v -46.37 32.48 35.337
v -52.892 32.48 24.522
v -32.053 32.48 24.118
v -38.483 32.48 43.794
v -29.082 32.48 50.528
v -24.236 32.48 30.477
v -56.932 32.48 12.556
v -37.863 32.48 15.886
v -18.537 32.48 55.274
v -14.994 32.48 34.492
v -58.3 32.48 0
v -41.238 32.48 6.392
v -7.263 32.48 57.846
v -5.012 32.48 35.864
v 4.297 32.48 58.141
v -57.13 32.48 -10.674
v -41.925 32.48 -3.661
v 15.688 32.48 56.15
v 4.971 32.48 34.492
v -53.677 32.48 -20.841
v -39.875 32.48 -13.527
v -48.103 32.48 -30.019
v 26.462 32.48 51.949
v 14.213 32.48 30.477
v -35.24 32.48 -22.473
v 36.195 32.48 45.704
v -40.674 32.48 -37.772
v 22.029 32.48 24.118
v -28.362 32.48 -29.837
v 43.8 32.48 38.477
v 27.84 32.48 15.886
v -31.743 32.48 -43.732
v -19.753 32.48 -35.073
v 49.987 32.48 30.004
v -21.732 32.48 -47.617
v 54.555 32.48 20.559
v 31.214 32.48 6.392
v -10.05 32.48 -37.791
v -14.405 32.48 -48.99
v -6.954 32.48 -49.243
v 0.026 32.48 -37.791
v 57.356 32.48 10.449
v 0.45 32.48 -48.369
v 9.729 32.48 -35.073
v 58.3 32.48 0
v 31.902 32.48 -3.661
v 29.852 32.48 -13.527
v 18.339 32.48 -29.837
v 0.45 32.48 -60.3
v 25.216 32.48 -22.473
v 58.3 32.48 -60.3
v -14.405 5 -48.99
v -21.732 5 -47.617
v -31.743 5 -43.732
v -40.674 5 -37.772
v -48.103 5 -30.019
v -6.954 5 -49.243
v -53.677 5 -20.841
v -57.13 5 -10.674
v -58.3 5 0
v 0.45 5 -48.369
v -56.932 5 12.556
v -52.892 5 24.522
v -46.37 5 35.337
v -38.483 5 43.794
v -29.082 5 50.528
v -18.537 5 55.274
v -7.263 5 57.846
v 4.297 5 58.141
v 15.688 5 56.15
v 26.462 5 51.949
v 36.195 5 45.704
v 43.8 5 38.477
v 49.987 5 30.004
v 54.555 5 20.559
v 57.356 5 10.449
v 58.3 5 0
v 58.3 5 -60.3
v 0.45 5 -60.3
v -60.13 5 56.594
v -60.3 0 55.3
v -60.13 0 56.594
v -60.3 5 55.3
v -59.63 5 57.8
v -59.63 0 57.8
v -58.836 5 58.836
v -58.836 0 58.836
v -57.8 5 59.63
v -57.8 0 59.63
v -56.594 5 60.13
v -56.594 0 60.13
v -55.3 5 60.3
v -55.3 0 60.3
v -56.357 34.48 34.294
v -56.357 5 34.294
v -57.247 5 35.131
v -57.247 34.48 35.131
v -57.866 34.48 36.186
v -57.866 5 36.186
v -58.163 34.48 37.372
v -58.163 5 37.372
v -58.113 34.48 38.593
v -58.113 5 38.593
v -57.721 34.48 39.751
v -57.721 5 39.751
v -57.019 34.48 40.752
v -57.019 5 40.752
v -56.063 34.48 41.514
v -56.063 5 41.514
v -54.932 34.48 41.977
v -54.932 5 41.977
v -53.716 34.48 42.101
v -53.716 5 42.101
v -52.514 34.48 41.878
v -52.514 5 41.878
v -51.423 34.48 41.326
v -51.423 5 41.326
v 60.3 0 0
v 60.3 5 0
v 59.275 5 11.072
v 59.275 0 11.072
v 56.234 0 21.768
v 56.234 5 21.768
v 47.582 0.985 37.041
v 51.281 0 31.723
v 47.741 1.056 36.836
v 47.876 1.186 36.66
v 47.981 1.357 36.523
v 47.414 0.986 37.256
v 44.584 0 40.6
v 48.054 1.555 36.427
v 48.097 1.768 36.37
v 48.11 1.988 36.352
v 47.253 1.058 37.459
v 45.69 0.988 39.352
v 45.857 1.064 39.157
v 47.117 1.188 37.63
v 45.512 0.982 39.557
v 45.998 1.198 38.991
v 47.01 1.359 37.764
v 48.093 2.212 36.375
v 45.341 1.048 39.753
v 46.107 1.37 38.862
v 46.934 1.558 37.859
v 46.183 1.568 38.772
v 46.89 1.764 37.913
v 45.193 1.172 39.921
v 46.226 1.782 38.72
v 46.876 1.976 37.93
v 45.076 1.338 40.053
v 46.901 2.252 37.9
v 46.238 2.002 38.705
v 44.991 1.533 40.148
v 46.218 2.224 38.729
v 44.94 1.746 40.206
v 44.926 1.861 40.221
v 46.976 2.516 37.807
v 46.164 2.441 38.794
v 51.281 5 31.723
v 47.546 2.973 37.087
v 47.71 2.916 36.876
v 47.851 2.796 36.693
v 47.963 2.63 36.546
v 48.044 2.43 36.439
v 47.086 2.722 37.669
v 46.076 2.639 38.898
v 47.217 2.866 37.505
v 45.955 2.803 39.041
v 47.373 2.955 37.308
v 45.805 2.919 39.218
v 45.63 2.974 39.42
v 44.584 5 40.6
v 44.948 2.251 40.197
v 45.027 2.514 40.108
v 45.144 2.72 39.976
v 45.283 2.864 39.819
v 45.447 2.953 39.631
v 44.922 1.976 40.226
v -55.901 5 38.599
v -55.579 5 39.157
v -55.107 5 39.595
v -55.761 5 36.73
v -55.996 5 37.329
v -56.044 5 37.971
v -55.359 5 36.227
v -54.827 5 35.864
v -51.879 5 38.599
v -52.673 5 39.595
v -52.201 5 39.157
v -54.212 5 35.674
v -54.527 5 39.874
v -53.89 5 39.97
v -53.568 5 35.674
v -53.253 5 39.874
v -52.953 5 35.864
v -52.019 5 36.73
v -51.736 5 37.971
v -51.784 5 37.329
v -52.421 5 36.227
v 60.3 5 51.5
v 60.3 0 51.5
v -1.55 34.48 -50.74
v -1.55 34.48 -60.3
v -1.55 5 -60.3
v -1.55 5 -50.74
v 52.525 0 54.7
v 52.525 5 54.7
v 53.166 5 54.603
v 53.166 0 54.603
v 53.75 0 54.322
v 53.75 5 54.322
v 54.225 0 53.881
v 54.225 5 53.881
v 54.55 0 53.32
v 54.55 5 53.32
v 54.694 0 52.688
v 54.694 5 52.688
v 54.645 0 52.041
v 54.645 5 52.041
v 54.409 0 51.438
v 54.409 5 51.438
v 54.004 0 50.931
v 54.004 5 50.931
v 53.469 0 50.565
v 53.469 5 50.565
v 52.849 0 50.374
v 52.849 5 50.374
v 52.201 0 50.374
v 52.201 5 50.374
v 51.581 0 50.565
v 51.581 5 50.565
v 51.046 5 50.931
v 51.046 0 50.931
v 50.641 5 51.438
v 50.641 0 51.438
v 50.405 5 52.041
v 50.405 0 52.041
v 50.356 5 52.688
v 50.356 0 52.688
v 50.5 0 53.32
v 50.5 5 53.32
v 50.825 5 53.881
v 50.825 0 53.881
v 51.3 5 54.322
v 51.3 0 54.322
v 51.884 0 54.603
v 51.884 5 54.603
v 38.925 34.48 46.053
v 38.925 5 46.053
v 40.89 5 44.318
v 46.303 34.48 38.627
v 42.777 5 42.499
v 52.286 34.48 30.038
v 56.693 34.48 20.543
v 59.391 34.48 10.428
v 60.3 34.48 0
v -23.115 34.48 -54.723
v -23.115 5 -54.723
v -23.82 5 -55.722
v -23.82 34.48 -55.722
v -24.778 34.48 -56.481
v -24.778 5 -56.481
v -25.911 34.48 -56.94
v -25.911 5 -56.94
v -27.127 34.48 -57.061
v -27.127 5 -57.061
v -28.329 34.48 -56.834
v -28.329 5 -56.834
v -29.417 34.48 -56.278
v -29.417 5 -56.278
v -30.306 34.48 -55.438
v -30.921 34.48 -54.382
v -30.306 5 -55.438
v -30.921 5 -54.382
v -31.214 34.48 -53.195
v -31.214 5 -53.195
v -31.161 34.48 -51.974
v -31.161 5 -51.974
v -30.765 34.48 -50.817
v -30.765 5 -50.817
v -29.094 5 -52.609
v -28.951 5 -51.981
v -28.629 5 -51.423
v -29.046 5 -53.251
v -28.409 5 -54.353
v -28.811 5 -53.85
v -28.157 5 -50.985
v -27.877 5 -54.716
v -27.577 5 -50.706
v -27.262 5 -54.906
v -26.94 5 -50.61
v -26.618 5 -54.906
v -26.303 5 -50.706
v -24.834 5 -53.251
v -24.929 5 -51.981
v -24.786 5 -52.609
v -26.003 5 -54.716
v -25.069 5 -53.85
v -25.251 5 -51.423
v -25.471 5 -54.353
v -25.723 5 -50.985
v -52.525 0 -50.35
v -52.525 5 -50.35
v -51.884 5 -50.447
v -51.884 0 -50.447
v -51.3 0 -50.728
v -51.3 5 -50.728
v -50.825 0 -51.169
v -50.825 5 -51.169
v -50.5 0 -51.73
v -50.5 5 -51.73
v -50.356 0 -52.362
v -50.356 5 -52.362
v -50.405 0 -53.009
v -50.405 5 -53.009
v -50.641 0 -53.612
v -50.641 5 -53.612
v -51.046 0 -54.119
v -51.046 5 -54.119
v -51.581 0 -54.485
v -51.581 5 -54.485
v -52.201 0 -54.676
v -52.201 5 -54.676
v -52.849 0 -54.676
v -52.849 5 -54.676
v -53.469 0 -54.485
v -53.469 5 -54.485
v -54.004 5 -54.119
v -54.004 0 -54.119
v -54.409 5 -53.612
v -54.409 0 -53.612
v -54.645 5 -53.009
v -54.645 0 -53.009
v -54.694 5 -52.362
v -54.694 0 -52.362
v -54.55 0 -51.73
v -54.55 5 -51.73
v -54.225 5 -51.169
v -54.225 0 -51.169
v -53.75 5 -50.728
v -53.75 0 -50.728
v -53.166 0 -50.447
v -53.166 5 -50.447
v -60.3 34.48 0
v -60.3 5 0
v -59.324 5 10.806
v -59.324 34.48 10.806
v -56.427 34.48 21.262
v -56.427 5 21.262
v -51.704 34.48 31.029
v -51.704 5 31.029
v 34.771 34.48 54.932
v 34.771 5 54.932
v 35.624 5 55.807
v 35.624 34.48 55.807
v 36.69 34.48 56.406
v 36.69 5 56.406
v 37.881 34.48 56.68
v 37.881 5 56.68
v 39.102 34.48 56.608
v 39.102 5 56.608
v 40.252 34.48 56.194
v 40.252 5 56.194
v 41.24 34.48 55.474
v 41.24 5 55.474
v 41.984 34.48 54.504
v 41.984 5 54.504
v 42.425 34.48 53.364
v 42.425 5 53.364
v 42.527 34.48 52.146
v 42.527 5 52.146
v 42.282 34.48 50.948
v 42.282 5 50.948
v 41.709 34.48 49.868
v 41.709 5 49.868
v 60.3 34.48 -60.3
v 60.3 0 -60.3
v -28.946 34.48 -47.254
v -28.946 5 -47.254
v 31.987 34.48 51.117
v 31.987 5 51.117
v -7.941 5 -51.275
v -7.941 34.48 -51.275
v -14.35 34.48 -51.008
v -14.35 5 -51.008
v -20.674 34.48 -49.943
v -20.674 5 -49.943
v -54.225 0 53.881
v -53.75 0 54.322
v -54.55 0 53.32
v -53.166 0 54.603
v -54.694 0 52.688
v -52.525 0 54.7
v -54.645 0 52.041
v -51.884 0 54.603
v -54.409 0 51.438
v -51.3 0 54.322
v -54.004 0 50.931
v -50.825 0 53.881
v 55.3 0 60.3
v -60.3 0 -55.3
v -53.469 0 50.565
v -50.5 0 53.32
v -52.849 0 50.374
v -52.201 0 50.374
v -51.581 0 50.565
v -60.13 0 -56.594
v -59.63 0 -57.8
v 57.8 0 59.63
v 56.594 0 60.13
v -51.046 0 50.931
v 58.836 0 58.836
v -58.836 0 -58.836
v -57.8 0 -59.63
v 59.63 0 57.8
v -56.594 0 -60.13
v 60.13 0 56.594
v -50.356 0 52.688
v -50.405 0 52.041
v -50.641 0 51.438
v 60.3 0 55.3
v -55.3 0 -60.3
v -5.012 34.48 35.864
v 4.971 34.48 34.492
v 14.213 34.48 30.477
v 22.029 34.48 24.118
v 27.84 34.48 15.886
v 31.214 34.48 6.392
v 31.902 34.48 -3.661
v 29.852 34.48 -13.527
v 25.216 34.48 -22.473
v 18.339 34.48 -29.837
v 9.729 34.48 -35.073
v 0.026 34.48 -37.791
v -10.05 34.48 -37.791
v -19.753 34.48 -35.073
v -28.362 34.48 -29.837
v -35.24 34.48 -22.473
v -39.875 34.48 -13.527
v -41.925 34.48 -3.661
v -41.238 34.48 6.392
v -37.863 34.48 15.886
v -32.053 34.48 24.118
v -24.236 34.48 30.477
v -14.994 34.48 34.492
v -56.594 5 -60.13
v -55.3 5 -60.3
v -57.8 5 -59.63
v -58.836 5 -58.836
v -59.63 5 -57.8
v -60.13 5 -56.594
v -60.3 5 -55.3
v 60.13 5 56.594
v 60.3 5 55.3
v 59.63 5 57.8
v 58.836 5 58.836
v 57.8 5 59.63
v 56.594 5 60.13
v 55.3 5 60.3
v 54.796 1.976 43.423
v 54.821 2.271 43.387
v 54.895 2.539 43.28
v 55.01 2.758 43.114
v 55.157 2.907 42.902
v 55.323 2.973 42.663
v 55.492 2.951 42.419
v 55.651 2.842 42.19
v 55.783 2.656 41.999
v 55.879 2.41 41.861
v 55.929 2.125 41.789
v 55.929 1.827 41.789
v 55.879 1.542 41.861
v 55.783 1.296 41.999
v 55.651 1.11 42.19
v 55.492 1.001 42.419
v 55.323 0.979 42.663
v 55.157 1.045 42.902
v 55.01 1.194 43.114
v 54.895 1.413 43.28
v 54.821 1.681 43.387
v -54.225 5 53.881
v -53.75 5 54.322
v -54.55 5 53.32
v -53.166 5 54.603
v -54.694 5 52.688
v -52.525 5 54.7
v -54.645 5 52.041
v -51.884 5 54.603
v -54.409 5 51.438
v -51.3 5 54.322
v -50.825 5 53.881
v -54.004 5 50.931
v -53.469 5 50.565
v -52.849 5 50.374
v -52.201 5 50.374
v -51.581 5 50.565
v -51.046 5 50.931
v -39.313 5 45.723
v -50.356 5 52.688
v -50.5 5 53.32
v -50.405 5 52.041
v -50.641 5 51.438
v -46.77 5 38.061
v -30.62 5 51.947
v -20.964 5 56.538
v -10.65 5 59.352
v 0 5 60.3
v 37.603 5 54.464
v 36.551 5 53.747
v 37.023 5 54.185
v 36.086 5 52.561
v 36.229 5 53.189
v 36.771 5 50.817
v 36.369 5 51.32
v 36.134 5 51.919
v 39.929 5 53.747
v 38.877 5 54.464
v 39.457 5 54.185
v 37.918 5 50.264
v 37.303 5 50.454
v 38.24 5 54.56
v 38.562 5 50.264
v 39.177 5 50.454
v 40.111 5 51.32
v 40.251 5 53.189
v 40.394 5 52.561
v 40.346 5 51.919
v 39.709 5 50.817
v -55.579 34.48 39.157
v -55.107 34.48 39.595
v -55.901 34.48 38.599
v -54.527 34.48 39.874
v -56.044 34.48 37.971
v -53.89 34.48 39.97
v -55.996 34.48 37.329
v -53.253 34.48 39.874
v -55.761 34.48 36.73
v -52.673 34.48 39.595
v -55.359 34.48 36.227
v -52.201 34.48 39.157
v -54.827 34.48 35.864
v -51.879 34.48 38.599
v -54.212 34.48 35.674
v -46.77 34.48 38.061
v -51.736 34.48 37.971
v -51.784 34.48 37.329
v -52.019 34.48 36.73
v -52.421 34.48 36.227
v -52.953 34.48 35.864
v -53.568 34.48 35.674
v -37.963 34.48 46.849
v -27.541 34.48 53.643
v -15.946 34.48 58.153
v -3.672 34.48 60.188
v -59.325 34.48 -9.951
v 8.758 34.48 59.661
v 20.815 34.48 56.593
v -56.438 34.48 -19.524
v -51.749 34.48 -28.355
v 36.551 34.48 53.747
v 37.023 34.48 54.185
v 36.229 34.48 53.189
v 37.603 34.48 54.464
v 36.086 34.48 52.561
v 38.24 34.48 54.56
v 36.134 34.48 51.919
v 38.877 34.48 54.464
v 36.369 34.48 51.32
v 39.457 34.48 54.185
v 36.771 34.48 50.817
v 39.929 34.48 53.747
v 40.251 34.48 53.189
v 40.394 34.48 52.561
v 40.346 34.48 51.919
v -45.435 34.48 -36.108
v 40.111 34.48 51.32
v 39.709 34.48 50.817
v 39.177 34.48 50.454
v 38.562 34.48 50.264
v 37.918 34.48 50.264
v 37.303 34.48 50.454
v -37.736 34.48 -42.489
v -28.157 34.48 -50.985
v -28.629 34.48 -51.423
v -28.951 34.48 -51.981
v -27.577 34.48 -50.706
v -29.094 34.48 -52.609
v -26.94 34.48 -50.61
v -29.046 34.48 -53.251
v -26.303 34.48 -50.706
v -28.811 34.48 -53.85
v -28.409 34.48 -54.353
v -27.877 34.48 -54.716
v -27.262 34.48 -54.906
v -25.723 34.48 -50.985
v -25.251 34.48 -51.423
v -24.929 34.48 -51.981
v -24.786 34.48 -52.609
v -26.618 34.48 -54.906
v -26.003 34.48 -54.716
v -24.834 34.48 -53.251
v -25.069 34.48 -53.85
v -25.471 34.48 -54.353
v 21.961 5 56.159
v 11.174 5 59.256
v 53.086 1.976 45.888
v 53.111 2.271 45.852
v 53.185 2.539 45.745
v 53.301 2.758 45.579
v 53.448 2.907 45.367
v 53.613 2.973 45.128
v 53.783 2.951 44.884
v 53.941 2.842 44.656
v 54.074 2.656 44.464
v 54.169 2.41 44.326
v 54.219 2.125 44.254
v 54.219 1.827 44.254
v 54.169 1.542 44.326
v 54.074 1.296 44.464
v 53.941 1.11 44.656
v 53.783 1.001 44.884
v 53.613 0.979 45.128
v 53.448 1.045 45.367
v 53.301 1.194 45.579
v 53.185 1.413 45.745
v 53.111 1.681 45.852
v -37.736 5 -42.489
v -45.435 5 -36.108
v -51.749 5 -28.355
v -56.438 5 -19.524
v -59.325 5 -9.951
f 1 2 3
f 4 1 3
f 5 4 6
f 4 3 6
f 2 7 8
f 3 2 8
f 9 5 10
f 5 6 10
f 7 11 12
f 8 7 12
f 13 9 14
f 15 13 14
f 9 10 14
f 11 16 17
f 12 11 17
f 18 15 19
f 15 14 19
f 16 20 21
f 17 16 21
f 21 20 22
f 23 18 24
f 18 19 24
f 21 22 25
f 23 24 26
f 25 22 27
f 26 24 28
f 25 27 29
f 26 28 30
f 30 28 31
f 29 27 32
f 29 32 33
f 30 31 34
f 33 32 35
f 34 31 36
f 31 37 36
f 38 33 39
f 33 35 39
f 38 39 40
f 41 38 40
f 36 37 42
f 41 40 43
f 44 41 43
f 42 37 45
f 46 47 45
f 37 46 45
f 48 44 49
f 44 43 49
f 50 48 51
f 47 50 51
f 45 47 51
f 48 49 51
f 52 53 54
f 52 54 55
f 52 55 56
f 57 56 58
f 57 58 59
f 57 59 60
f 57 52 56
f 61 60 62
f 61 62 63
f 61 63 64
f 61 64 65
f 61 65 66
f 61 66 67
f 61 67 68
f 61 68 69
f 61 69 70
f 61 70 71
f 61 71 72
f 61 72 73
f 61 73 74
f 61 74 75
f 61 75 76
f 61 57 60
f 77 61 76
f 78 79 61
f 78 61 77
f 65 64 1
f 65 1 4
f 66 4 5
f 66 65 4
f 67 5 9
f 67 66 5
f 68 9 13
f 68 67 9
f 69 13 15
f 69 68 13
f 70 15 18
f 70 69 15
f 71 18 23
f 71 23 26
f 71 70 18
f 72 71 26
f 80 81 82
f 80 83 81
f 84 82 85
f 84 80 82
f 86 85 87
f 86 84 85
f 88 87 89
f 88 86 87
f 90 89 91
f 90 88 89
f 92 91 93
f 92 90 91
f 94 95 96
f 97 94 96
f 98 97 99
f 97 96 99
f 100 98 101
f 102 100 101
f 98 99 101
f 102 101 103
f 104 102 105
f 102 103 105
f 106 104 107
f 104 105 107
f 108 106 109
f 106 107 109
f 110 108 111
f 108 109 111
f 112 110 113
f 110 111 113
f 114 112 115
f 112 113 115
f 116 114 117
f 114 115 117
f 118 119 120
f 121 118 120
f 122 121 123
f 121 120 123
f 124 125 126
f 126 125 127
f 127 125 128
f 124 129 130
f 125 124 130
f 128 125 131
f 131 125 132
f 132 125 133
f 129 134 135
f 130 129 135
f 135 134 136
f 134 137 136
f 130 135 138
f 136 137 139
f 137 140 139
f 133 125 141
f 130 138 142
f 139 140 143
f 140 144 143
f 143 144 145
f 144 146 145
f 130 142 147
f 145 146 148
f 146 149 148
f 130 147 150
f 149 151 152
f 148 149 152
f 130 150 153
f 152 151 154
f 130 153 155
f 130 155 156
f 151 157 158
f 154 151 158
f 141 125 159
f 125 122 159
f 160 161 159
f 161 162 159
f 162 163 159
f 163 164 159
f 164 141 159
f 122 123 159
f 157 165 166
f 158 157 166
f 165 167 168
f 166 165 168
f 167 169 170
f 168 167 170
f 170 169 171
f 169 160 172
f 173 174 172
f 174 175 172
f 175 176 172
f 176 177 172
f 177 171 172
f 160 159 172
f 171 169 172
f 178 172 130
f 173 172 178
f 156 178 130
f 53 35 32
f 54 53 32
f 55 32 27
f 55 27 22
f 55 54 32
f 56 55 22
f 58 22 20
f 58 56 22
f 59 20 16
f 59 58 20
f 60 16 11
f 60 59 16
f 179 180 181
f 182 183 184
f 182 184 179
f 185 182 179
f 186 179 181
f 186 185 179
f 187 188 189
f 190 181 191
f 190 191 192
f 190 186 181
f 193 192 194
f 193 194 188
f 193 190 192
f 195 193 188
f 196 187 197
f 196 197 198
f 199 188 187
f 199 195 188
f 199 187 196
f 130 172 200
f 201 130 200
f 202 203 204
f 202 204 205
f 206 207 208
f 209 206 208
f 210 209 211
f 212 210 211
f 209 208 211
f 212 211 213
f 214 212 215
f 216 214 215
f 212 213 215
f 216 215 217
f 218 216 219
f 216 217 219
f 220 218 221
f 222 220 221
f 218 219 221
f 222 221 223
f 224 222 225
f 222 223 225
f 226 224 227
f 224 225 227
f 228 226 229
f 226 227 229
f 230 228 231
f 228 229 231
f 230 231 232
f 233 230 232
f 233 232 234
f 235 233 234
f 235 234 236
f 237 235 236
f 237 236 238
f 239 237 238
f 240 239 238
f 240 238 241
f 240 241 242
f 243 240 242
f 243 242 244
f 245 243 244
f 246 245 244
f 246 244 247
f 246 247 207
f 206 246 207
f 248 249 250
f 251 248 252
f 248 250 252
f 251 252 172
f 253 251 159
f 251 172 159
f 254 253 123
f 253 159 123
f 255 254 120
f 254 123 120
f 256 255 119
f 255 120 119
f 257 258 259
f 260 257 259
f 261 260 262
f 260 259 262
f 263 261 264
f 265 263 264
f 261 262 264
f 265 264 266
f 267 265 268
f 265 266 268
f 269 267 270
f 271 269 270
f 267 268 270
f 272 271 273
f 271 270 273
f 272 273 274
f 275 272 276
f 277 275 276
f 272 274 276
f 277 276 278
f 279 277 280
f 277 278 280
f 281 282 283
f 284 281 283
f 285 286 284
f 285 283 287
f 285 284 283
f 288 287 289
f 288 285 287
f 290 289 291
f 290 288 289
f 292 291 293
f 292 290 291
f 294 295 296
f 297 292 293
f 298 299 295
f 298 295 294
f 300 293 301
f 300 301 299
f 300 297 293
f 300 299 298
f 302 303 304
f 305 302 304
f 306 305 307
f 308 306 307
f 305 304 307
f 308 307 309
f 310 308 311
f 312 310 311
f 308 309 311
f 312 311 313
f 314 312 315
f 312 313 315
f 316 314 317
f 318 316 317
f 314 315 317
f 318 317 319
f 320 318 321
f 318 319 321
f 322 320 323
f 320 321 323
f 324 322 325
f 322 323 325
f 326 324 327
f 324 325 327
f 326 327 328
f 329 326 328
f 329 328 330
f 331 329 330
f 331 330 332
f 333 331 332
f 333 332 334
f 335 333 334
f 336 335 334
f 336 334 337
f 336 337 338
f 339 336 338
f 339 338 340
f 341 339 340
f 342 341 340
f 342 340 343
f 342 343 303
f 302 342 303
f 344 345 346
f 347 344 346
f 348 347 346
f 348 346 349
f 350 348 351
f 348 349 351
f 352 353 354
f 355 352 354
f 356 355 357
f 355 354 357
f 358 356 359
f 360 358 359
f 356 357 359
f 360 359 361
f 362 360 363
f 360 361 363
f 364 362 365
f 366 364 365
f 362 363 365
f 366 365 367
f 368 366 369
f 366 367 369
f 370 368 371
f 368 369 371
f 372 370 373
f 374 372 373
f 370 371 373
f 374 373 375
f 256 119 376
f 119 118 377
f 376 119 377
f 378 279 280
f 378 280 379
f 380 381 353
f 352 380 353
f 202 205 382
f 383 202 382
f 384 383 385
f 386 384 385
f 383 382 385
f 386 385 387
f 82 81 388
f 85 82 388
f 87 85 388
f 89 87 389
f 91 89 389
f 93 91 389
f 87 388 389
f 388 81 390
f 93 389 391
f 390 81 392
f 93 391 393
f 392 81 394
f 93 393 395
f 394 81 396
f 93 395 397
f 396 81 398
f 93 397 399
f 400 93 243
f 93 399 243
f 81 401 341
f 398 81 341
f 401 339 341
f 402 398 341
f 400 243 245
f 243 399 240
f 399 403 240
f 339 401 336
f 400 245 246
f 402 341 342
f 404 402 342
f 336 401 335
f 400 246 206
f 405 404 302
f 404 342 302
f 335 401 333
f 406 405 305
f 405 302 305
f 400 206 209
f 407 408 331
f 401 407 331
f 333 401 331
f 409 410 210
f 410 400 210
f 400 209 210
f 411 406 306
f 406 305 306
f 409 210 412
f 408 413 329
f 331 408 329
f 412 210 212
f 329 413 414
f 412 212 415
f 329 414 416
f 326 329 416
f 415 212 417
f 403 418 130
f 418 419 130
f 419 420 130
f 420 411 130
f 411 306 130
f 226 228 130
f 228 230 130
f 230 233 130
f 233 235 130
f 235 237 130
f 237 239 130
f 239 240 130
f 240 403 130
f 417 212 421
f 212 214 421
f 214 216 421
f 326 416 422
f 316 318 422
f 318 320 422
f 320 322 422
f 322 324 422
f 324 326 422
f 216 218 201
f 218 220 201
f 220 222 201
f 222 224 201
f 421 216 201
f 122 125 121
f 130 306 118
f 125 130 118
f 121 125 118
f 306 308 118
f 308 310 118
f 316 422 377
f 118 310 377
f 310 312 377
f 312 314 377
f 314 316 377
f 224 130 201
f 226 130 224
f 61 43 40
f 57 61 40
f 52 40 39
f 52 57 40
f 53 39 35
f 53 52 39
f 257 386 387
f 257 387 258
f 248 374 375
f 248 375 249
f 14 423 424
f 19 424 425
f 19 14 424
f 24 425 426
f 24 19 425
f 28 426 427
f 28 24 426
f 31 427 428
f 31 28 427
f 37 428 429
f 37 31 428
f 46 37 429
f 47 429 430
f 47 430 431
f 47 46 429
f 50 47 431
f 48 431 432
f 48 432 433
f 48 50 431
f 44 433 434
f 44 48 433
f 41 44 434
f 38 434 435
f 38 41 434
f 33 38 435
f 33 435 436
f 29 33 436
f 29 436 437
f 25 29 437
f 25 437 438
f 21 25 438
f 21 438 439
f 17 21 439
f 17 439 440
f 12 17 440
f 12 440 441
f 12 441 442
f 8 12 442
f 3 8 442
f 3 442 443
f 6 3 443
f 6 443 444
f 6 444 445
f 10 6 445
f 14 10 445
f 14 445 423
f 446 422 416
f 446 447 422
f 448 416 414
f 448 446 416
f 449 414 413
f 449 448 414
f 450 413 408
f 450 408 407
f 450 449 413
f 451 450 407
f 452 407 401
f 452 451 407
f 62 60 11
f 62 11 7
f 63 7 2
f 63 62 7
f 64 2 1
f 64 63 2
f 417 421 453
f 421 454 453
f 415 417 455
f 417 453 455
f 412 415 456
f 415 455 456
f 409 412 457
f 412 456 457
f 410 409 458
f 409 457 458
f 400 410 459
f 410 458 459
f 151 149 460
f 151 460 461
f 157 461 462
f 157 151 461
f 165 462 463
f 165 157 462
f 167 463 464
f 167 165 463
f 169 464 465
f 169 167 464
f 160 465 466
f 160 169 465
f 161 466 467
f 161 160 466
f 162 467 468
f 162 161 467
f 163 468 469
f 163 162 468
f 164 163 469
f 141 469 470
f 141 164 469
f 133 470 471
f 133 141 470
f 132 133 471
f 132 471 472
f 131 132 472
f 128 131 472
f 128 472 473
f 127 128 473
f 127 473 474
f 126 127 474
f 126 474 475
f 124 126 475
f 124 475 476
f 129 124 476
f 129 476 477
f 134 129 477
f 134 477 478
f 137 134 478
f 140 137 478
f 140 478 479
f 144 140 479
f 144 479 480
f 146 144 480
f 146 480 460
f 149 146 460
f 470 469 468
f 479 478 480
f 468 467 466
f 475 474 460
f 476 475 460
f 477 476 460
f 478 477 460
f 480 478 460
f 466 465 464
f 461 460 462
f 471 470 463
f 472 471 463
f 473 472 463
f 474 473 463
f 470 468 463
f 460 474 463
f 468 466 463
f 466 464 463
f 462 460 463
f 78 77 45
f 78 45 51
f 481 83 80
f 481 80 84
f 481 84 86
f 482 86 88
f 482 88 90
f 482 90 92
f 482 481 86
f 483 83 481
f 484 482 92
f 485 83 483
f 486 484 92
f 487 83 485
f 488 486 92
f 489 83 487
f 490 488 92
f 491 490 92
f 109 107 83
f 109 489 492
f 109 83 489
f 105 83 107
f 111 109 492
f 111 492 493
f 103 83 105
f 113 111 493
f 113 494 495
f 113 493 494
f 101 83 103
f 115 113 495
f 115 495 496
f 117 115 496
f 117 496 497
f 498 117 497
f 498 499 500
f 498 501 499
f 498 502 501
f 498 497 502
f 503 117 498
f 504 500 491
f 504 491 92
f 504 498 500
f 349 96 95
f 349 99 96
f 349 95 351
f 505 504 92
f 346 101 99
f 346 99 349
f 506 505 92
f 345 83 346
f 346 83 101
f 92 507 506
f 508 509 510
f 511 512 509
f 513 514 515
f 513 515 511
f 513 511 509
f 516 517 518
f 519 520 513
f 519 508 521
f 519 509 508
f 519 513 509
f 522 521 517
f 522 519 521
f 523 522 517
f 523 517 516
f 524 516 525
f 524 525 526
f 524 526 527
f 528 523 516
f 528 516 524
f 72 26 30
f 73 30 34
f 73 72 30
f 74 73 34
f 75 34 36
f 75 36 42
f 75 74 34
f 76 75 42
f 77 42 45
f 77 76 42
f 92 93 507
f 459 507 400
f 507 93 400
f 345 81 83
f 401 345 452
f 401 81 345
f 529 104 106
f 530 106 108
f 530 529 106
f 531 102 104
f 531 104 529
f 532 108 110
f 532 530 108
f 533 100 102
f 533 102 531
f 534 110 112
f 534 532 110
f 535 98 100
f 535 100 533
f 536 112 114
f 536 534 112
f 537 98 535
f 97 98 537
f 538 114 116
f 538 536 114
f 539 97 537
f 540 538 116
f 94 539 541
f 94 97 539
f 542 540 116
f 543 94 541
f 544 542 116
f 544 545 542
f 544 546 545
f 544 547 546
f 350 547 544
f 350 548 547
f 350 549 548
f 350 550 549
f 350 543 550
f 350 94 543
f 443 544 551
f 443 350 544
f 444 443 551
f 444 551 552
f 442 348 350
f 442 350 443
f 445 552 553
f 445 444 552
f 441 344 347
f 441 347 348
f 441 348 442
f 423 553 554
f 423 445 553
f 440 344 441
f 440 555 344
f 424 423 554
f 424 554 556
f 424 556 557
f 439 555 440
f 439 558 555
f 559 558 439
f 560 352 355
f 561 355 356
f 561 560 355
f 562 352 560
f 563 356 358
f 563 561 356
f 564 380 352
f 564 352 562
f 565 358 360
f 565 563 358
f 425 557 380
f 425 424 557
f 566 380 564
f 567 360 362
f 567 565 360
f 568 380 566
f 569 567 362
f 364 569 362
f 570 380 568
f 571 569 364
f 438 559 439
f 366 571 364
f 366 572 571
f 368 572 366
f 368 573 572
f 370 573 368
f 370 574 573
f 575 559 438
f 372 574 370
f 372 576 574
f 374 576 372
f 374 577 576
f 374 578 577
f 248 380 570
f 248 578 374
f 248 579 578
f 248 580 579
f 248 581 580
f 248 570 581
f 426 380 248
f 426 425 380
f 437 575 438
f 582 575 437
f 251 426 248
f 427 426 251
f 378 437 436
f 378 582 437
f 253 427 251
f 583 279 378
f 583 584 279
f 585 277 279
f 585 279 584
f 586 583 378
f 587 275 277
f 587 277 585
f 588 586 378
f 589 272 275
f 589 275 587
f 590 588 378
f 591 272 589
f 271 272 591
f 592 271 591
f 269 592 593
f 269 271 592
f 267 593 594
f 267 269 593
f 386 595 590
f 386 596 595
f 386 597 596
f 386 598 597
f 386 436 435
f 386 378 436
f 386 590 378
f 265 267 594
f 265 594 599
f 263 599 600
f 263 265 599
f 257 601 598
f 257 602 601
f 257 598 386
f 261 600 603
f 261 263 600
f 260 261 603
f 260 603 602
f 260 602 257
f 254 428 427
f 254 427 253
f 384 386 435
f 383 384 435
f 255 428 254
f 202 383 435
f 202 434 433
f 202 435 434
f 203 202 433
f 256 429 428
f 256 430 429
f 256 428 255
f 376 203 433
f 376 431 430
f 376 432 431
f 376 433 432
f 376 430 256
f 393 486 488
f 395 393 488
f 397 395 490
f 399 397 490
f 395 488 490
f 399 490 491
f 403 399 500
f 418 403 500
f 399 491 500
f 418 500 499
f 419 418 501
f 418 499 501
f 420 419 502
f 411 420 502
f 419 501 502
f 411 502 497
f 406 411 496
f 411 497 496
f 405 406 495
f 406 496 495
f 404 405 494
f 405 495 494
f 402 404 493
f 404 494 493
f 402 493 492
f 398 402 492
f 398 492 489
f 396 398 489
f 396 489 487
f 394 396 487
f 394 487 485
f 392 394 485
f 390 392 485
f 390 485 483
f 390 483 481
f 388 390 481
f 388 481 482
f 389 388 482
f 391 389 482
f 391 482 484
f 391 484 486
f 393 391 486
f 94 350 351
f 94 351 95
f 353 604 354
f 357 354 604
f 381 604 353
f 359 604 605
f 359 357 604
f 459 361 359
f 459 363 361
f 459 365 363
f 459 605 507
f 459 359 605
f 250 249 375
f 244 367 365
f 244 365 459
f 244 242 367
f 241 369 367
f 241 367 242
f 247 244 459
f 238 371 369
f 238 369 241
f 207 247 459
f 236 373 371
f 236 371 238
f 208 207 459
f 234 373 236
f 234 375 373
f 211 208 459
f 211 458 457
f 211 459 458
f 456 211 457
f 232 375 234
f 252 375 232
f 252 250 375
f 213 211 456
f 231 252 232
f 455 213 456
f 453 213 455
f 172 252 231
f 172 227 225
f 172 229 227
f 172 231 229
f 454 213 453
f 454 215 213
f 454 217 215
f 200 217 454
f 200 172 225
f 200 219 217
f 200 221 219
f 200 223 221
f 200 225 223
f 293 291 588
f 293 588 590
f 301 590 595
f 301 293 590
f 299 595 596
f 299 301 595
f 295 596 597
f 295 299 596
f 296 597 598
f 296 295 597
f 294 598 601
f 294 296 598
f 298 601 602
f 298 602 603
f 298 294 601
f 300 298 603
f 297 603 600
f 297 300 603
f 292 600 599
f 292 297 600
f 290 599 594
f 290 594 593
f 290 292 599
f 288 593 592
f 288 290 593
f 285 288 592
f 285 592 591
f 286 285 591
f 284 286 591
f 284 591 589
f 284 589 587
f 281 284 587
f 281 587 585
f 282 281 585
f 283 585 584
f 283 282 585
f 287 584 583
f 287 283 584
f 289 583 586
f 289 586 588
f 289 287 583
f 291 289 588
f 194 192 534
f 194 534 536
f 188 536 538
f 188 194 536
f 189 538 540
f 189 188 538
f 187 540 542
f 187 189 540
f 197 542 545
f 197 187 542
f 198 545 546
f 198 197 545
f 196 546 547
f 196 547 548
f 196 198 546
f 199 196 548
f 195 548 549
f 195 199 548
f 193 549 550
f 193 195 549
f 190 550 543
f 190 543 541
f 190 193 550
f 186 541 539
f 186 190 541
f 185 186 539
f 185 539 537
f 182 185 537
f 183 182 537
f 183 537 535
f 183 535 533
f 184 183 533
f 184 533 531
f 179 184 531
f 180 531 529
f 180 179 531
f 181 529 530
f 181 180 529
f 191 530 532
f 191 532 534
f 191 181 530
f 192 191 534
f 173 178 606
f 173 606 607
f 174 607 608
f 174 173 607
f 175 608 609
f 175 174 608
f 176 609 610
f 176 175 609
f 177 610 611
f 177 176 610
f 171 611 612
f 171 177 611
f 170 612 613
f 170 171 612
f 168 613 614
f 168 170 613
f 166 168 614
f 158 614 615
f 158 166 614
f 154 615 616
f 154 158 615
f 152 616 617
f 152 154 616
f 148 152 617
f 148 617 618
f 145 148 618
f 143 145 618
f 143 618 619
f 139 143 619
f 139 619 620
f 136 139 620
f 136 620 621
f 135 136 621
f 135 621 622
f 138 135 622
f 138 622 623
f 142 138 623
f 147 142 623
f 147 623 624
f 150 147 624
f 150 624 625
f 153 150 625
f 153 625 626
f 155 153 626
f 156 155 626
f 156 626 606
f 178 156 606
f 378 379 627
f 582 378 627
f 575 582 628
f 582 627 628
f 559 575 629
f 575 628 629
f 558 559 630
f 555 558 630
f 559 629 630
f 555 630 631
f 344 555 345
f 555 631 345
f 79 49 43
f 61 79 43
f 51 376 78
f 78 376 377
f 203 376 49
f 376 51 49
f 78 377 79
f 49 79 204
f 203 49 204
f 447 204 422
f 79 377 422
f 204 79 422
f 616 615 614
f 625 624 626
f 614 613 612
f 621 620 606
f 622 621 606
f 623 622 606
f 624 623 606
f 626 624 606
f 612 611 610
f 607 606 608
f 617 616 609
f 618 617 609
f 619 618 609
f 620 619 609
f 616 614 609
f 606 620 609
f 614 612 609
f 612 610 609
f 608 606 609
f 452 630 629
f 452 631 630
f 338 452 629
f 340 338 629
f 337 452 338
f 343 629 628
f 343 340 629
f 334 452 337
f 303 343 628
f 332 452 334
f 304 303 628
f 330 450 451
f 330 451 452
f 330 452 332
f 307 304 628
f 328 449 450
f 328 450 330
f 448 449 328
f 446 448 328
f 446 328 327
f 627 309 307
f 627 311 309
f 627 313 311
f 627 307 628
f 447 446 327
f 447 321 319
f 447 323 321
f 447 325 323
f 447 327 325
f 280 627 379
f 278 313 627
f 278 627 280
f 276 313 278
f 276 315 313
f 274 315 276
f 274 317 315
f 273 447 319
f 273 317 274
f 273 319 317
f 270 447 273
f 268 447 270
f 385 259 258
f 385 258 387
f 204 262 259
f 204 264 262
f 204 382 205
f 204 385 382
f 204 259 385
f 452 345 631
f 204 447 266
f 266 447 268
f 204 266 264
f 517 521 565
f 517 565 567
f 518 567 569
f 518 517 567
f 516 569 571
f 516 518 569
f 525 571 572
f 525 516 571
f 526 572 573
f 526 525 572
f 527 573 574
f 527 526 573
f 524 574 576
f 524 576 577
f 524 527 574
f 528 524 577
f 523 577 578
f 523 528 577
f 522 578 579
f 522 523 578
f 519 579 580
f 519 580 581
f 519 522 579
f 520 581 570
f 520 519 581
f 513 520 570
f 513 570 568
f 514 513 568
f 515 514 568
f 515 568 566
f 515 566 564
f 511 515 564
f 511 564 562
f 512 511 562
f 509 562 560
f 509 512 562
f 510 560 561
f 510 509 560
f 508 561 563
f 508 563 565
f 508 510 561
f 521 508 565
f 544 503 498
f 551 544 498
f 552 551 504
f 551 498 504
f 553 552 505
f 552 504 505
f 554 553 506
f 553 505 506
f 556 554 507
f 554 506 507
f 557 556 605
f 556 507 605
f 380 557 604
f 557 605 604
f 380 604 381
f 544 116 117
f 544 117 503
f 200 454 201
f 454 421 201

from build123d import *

# Parameters (mm, degrees)
ESBO_O1_W                = 120.6
ESBO_O1_H                = 120.6
RESSALTO_EXTRUS_O1_DEPTH = 5
ESBO_O2_R                = 2.16
ESBO_O2_R_2              = 37
RESSALTO_EXTRUS_O2_DEPTH = 29.48
CORTE_EXTRUS_O1_DEPTH    = 27.48
CORTE_EXTRUS_O2_REACH    = 92.229
ESBO_O4_R                = 2.175
CORTE_EXTRUS_O3_REACH    = 92.229
FILETE1_R                = 5
ESBO_O6_R                = 1
RESSALTO_EXTRUS_O3_DEPTH = 10


with BuildPart() as part:
    # Esboço1 → Ressalto-extrusão1 (new body)
    with BuildSketch(Plane(origin=(0, 0, 0), x_dir=(1, 0, 0), z_dir=(0, 1, 0))):
        Rectangle(ESBO_O1_W, ESBO_O1_H)
    extrude(amount=RESSALTO_EXTRUS_O1_DEPTH)

    # Esboço2 → Ressalto-extrusão2 (add)
    with BuildSketch(Plane(origin=(0, 5, 0), x_dir=(1, 0, 0), z_dir=(0, 1, 0))):
        with BuildLine():
            Line((-1.55, 60.3), (-1.55, 50.74))
            ThreePointArc((-1.55, 50.74), (-11.149709748, 51.241553514), (-20.674386419, 49.942893633))
            Line((-20.674386419, 49.942893633), (-23.114662996, 54.72290087))
            ThreePointArc((-23.114662996, 54.72290087), (-28.89290087, 56.595337004), (-30.765337004, 50.81709913))
            Line((-30.765337004, 50.81709913), (-28.946397101, 47.25416451))
            ThreePointArc((-28.946397101, 47.25416451), (-51.748686365, 28.3549135), (-60.3, 0))
            ThreePointArc((-60.3, 0), (-58.11119265, -16.099046207), (-51.703672015, -31.029345791))
            Line((-51.703672015, -31.029345791), (-56.356828802, -34.294067597))
            ThreePointArc((-56.356828802, -34.294067597), (-57.405932403, -40.276828802), (-51.423171198, -41.325932403))
            Line((-51.423171198, -41.325932403), (-46.77001441, -38.061210596))
            ThreePointArc((-46.77001441, -38.061210596), (-9.861567273, -59.488145802), (31.986619032, -51.116985464))
            Line((31.986619032, -51.116985464), (34.770606047, -54.931863068))
            ThreePointArc((34.770606047, -54.931863068), (40.771863068, -55.869393953), (41.709393953, -49.868136932))
            Line((41.709393953, -49.868136932), (38.925406938, -46.053259327))
            ThreePointArc((38.925406938, -46.053259327), (54.695941524, -25.385901221), (60.3, 0))
            Line((60.3, 0), (60.3, 60.3))
            Line((60.3, 60.3), (-1.55, 60.3))
        make_face()
        with Locations(Location((-53.89, -37.81, 0), (0, 0, 270))):
            Circle(ESBO_O2_R, mode=Mode.SUBTRACT)
        with Locations(Location((38.24, -52.4, 0), (0, 0, 270))):
            Circle(ESBO_O2_R, mode=Mode.SUBTRACT)
        with Locations(Location((-5.011670261, 1.136043404, 0), (0, 0, 270))):
            Circle(ESBO_O2_R_2, mode=Mode.SUBTRACT)
        with Locations(Location((-26.94, 52.77, 0), (0, 0, 270))):
            Circle(ESBO_O2_R, mode=Mode.SUBTRACT)
    extrude(amount=RESSALTO_EXTRUS_O2_DEPTH)

    # Esboço3 → Corte-extrusão1 (cut)
    with BuildSketch(Plane(origin=(0, 5, 0), x_dir=(1, 0, 0), z_dir=(0, 1, 0))):
        with BuildLine():
            Line((58.3, 60.3), (0.45, 60.3))
            Line((0.45, 60.3), (0.45, 48.368870154))
            ThreePointArc((0.45, 48.368870154), (-10.684091117, 49.257737718), (-21.732404969, 47.616752781))
            ThreePointArc((-21.732404969, 47.616752781), (-48.103316228, 30.018927995), (-58.3, 0))
            ThreePointArc((-58.3, 0), (-55.237005698, -18.64841016), (-46.369873019, -35.337301485))
            ThreePointArc((-46.369873019, -35.337301485), (-7.26299238, -57.845820434), (36.194519906, -45.703902774))
            ThreePointArc((36.194519906, -45.703902774), (52.483476021, -25.384537513), (58.3, 0))
            Line((58.3, 0), (58.3, 60.3))
        make_face()
    extrude(amount=CORTE_EXTRUS_O1_DEPTH, mode=Mode.SUBTRACT)

    # Esboço4 → Corte-extrusão2 (cut, up to next)
    with BuildSketch(Plane(origin=(0, 5, 0), x_dir=(1, 0, 0), z_dir=(0, 1, 0)), mode=Mode.PRIVATE) as corte_extrus_o2_sk1:
        with Locations(Location((-52.525, 52.525, 0), (0, 0, 270))):
            Circle(ESBO_O4_R)
    corte_extrus_o2_tool1 = extrude(corte_extrus_o2_sk1.sketch, amount=-CORTE_EXTRUS_O2_REACH, mode=Mode.PRIVATE) & part.part
    # Esboço4 → Corte-extrusão2 (cut, up to next)
    with BuildSketch(Plane(origin=(0, 5, 0), x_dir=(1, 0, 0), z_dir=(0, 1, 0)), mode=Mode.PRIVATE) as corte_extrus_o2_sk2:
        with Locations(Location((-52.525, -52.525, 0), (0, 0, 270))):
            Circle(ESBO_O4_R)
    corte_extrus_o2_tool2 = extrude(corte_extrus_o2_sk2.sketch, amount=-CORTE_EXTRUS_O2_REACH, mode=Mode.PRIVATE) & part.part
    # Esboço4 → Corte-extrusão2 (cut, up to next)
    with BuildSketch(Plane(origin=(0, 5, 0), x_dir=(1, 0, 0), z_dir=(0, 1, 0)), mode=Mode.PRIVATE) as corte_extrus_o2_sk3:
        with Locations(Location((52.525, -52.525, 0), (0, 0, 270))):
            Circle(ESBO_O4_R)
    corte_extrus_o2_tool3 = extrude(corte_extrus_o2_sk3.sketch, amount=-CORTE_EXTRUS_O2_REACH, mode=Mode.PRIVATE) & part.part
    add(corte_extrus_o2_tool1.solids().sort_by_distance((-52.525, 5, -52.525))[0], mode=Mode.SUBTRACT)
    add(corte_extrus_o2_tool2.solids().sort_by_distance((-52.525, 5, 52.525))[0], mode=Mode.SUBTRACT)
    add(corte_extrus_o2_tool3.solids().sort_by_distance((52.525, 5, 52.525))[0], mode=Mode.SUBTRACT)

    # Esboço5 → Corte-extrusão3 (cut, up to next)
    with BuildSketch(Plane(origin=(0, 5, 0), x_dir=(1, 0, 0), z_dir=(0, 1, 0)), mode=Mode.PRIVATE) as corte_extrus_o3_sk1:
        with BuildLine():
            Line((44.583965728, -40.6), (60.3, -51.5))
            Line((60.3, -51.5), (60.3, 0))
            ThreePointArc((60.3, 0), (56.233900511, -21.767830239), (44.583965728, -40.6))
        make_face()
    corte_extrus_o3_tool1 = extrude(corte_extrus_o3_sk1.sketch, amount=-CORTE_EXTRUS_O3_REACH, mode=Mode.PRIVATE) & part.part
    add(corte_extrus_o3_tool1.solids().sort_by_distance((55.517815, 5, 34.778599))[0], mode=Mode.SUBTRACT)

    # Filete1
    filete1_edges = [part.edges().sort_by_distance(p)[0] for p in [
        (-60.3, 2.5, -60.3),
        (60.3, 2.5, 60.3),
        (-60.3, 2.5, 60.3),
    ]]
    fillet(filete1_edges, radius=FILETE1_R)

    # Esboço6 → Ressalto-extrusão3 (add)
    with BuildSketch(Plane(origin=(49.116321983, 0, 34.065076491), x_dir=(0, 1, 0), z_dir=(-0.8217106210842787, 1.9312545644066756e-15, -0.5699049527748369))):
        with Locations(Location((1.975912972, -6.452828334, 0), (0, 0, 270))):
            Circle(ESBO_O6_R)
        with Locations(Location((1.975912972, -3.452828334, 0), (0, 0, 270))):
            Circle(ESBO_O6_R)
    extrude(amount=-RESSALTO_EXTRUS_O3_DEPTH)


solid = part.part
